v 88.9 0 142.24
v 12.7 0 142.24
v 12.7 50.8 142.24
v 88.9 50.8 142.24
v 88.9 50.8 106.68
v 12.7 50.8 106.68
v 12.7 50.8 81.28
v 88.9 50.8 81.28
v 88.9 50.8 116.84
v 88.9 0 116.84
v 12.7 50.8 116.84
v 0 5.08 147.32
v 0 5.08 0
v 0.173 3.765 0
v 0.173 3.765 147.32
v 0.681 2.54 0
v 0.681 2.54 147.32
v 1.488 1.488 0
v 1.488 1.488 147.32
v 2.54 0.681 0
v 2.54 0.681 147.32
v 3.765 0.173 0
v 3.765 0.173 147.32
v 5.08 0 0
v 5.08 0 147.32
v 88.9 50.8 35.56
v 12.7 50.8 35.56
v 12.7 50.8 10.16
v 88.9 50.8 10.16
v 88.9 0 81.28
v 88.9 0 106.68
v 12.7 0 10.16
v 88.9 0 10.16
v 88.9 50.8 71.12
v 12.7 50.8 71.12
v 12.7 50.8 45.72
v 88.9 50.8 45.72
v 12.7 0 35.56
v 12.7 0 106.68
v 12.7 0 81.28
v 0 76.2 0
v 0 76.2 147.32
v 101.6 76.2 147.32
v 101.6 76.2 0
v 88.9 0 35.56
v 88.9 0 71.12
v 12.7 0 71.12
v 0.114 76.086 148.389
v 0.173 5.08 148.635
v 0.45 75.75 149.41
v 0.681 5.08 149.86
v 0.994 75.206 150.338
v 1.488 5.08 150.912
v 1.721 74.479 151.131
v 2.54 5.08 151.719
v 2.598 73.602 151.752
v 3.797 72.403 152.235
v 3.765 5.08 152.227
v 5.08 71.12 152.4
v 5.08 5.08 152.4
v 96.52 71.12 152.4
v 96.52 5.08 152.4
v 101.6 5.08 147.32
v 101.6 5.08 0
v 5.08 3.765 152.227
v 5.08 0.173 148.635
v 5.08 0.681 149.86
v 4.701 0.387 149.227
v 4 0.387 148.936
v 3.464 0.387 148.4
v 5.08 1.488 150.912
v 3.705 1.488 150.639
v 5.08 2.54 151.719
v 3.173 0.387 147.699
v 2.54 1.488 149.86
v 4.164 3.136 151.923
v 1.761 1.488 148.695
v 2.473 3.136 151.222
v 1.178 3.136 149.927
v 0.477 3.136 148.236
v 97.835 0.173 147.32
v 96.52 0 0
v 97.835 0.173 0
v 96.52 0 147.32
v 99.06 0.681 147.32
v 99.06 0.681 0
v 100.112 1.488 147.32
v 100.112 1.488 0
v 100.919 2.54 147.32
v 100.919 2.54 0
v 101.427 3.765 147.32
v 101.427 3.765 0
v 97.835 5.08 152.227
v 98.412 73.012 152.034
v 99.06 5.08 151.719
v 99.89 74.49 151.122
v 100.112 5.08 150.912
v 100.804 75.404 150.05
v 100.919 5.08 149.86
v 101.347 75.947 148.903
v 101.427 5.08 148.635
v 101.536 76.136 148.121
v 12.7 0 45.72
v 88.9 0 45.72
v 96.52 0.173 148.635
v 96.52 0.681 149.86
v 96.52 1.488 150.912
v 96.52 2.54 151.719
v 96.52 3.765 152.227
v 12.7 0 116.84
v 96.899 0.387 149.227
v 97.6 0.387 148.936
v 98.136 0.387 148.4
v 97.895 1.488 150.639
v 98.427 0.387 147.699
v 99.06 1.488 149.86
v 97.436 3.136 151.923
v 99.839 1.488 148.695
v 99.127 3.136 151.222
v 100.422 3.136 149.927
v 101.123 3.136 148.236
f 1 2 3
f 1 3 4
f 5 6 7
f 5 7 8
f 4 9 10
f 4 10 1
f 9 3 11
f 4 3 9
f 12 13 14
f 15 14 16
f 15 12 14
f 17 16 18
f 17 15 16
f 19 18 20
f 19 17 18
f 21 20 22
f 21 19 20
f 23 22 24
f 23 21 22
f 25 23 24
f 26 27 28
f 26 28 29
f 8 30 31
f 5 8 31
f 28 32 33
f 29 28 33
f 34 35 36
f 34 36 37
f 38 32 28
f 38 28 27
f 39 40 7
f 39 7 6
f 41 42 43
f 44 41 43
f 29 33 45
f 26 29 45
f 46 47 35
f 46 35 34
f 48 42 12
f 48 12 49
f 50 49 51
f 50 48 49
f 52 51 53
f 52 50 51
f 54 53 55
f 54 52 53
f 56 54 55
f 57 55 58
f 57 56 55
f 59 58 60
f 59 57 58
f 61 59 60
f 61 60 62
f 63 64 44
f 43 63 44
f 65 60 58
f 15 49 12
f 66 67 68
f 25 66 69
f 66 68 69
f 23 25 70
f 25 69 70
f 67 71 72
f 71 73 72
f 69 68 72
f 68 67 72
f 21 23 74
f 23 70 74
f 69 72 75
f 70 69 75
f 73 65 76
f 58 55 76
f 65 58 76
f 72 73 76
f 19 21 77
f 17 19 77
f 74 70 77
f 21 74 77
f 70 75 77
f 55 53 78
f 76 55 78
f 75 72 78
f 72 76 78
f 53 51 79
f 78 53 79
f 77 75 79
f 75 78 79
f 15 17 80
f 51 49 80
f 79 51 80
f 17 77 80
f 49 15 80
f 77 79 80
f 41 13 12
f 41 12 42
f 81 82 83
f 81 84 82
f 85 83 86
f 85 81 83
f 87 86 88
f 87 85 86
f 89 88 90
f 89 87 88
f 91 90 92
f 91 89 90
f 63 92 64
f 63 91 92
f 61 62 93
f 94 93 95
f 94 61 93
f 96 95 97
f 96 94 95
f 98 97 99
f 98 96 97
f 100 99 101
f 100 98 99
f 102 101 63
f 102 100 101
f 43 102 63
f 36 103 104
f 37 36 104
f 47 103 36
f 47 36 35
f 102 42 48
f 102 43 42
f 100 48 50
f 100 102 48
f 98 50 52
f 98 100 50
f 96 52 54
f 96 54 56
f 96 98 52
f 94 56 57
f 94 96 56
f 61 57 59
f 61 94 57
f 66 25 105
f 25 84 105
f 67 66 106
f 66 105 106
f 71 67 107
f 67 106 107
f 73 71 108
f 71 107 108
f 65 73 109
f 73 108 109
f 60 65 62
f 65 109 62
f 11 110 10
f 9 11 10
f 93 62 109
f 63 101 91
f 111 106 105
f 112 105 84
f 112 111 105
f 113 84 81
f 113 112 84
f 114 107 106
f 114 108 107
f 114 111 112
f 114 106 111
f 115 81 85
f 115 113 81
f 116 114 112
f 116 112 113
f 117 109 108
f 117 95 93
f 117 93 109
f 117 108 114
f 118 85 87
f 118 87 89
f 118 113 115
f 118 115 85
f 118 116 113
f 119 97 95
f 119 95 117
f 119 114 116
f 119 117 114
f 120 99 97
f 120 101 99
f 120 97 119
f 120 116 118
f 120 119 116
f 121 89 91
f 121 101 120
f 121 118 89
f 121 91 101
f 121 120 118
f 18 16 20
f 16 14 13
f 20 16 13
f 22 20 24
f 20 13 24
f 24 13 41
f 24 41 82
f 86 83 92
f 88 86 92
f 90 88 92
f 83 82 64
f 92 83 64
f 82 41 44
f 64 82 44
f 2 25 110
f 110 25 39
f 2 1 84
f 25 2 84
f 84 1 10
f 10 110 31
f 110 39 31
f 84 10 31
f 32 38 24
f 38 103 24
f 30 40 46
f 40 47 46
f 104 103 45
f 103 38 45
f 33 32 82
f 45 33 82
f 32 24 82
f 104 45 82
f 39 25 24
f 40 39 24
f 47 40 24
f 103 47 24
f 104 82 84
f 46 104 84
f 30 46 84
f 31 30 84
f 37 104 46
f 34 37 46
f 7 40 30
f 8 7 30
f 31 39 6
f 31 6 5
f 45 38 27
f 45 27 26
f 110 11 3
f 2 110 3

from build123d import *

# Parameters (mm, degrees)
F0_W     = 101.6
F0_H     = 76.2
F1_DEPTH = 152.4
F2_W     = 76.2
F2_H     = 25.4
F3_DEPTH = 50.8
F4_R     = 5.08


with BuildPart() as f1:
    # F0 (on Top) → F1 (new body)
    with BuildSketch(Plane.XY):
        with Locations((50.8, 38.1)):
            Rectangle(F0_W, F0_H)
    extrude(amount=F1_DEPTH)

    # F2 (on face) → F3 (cut)
    with BuildSketch(Plane.XZ):
        with Locations((50.8, 129.54)):
            Rectangle(F2_W, F2_H)
        with Locations((50.8, 93.98)):
            Rectangle(F2_W, F2_H)
        with Locations((50.8, 58.42)):
            Rectangle(F2_W, F2_H)
        with Locations((50.8, 22.86)):
            Rectangle(F2_W, F2_H)
    extrude(amount=-F3_DEPTH, mode=Mode.SUBTRACT)

    # F4
    f4_edges = [f1.edges().sort_by_distance(p)[0] for p in [
        (101.6, 38.1, 152.4),
        (0, 38.1, 152.4),
        (50.8, 0, 152.4),
        (50.8, 76.2, 152.4),
        (101.6, 0, 76.2),
        (0, 0, 76.2),
    ]]
    fillet(f4_edges, radius=F4_R)


solid = f1.part
